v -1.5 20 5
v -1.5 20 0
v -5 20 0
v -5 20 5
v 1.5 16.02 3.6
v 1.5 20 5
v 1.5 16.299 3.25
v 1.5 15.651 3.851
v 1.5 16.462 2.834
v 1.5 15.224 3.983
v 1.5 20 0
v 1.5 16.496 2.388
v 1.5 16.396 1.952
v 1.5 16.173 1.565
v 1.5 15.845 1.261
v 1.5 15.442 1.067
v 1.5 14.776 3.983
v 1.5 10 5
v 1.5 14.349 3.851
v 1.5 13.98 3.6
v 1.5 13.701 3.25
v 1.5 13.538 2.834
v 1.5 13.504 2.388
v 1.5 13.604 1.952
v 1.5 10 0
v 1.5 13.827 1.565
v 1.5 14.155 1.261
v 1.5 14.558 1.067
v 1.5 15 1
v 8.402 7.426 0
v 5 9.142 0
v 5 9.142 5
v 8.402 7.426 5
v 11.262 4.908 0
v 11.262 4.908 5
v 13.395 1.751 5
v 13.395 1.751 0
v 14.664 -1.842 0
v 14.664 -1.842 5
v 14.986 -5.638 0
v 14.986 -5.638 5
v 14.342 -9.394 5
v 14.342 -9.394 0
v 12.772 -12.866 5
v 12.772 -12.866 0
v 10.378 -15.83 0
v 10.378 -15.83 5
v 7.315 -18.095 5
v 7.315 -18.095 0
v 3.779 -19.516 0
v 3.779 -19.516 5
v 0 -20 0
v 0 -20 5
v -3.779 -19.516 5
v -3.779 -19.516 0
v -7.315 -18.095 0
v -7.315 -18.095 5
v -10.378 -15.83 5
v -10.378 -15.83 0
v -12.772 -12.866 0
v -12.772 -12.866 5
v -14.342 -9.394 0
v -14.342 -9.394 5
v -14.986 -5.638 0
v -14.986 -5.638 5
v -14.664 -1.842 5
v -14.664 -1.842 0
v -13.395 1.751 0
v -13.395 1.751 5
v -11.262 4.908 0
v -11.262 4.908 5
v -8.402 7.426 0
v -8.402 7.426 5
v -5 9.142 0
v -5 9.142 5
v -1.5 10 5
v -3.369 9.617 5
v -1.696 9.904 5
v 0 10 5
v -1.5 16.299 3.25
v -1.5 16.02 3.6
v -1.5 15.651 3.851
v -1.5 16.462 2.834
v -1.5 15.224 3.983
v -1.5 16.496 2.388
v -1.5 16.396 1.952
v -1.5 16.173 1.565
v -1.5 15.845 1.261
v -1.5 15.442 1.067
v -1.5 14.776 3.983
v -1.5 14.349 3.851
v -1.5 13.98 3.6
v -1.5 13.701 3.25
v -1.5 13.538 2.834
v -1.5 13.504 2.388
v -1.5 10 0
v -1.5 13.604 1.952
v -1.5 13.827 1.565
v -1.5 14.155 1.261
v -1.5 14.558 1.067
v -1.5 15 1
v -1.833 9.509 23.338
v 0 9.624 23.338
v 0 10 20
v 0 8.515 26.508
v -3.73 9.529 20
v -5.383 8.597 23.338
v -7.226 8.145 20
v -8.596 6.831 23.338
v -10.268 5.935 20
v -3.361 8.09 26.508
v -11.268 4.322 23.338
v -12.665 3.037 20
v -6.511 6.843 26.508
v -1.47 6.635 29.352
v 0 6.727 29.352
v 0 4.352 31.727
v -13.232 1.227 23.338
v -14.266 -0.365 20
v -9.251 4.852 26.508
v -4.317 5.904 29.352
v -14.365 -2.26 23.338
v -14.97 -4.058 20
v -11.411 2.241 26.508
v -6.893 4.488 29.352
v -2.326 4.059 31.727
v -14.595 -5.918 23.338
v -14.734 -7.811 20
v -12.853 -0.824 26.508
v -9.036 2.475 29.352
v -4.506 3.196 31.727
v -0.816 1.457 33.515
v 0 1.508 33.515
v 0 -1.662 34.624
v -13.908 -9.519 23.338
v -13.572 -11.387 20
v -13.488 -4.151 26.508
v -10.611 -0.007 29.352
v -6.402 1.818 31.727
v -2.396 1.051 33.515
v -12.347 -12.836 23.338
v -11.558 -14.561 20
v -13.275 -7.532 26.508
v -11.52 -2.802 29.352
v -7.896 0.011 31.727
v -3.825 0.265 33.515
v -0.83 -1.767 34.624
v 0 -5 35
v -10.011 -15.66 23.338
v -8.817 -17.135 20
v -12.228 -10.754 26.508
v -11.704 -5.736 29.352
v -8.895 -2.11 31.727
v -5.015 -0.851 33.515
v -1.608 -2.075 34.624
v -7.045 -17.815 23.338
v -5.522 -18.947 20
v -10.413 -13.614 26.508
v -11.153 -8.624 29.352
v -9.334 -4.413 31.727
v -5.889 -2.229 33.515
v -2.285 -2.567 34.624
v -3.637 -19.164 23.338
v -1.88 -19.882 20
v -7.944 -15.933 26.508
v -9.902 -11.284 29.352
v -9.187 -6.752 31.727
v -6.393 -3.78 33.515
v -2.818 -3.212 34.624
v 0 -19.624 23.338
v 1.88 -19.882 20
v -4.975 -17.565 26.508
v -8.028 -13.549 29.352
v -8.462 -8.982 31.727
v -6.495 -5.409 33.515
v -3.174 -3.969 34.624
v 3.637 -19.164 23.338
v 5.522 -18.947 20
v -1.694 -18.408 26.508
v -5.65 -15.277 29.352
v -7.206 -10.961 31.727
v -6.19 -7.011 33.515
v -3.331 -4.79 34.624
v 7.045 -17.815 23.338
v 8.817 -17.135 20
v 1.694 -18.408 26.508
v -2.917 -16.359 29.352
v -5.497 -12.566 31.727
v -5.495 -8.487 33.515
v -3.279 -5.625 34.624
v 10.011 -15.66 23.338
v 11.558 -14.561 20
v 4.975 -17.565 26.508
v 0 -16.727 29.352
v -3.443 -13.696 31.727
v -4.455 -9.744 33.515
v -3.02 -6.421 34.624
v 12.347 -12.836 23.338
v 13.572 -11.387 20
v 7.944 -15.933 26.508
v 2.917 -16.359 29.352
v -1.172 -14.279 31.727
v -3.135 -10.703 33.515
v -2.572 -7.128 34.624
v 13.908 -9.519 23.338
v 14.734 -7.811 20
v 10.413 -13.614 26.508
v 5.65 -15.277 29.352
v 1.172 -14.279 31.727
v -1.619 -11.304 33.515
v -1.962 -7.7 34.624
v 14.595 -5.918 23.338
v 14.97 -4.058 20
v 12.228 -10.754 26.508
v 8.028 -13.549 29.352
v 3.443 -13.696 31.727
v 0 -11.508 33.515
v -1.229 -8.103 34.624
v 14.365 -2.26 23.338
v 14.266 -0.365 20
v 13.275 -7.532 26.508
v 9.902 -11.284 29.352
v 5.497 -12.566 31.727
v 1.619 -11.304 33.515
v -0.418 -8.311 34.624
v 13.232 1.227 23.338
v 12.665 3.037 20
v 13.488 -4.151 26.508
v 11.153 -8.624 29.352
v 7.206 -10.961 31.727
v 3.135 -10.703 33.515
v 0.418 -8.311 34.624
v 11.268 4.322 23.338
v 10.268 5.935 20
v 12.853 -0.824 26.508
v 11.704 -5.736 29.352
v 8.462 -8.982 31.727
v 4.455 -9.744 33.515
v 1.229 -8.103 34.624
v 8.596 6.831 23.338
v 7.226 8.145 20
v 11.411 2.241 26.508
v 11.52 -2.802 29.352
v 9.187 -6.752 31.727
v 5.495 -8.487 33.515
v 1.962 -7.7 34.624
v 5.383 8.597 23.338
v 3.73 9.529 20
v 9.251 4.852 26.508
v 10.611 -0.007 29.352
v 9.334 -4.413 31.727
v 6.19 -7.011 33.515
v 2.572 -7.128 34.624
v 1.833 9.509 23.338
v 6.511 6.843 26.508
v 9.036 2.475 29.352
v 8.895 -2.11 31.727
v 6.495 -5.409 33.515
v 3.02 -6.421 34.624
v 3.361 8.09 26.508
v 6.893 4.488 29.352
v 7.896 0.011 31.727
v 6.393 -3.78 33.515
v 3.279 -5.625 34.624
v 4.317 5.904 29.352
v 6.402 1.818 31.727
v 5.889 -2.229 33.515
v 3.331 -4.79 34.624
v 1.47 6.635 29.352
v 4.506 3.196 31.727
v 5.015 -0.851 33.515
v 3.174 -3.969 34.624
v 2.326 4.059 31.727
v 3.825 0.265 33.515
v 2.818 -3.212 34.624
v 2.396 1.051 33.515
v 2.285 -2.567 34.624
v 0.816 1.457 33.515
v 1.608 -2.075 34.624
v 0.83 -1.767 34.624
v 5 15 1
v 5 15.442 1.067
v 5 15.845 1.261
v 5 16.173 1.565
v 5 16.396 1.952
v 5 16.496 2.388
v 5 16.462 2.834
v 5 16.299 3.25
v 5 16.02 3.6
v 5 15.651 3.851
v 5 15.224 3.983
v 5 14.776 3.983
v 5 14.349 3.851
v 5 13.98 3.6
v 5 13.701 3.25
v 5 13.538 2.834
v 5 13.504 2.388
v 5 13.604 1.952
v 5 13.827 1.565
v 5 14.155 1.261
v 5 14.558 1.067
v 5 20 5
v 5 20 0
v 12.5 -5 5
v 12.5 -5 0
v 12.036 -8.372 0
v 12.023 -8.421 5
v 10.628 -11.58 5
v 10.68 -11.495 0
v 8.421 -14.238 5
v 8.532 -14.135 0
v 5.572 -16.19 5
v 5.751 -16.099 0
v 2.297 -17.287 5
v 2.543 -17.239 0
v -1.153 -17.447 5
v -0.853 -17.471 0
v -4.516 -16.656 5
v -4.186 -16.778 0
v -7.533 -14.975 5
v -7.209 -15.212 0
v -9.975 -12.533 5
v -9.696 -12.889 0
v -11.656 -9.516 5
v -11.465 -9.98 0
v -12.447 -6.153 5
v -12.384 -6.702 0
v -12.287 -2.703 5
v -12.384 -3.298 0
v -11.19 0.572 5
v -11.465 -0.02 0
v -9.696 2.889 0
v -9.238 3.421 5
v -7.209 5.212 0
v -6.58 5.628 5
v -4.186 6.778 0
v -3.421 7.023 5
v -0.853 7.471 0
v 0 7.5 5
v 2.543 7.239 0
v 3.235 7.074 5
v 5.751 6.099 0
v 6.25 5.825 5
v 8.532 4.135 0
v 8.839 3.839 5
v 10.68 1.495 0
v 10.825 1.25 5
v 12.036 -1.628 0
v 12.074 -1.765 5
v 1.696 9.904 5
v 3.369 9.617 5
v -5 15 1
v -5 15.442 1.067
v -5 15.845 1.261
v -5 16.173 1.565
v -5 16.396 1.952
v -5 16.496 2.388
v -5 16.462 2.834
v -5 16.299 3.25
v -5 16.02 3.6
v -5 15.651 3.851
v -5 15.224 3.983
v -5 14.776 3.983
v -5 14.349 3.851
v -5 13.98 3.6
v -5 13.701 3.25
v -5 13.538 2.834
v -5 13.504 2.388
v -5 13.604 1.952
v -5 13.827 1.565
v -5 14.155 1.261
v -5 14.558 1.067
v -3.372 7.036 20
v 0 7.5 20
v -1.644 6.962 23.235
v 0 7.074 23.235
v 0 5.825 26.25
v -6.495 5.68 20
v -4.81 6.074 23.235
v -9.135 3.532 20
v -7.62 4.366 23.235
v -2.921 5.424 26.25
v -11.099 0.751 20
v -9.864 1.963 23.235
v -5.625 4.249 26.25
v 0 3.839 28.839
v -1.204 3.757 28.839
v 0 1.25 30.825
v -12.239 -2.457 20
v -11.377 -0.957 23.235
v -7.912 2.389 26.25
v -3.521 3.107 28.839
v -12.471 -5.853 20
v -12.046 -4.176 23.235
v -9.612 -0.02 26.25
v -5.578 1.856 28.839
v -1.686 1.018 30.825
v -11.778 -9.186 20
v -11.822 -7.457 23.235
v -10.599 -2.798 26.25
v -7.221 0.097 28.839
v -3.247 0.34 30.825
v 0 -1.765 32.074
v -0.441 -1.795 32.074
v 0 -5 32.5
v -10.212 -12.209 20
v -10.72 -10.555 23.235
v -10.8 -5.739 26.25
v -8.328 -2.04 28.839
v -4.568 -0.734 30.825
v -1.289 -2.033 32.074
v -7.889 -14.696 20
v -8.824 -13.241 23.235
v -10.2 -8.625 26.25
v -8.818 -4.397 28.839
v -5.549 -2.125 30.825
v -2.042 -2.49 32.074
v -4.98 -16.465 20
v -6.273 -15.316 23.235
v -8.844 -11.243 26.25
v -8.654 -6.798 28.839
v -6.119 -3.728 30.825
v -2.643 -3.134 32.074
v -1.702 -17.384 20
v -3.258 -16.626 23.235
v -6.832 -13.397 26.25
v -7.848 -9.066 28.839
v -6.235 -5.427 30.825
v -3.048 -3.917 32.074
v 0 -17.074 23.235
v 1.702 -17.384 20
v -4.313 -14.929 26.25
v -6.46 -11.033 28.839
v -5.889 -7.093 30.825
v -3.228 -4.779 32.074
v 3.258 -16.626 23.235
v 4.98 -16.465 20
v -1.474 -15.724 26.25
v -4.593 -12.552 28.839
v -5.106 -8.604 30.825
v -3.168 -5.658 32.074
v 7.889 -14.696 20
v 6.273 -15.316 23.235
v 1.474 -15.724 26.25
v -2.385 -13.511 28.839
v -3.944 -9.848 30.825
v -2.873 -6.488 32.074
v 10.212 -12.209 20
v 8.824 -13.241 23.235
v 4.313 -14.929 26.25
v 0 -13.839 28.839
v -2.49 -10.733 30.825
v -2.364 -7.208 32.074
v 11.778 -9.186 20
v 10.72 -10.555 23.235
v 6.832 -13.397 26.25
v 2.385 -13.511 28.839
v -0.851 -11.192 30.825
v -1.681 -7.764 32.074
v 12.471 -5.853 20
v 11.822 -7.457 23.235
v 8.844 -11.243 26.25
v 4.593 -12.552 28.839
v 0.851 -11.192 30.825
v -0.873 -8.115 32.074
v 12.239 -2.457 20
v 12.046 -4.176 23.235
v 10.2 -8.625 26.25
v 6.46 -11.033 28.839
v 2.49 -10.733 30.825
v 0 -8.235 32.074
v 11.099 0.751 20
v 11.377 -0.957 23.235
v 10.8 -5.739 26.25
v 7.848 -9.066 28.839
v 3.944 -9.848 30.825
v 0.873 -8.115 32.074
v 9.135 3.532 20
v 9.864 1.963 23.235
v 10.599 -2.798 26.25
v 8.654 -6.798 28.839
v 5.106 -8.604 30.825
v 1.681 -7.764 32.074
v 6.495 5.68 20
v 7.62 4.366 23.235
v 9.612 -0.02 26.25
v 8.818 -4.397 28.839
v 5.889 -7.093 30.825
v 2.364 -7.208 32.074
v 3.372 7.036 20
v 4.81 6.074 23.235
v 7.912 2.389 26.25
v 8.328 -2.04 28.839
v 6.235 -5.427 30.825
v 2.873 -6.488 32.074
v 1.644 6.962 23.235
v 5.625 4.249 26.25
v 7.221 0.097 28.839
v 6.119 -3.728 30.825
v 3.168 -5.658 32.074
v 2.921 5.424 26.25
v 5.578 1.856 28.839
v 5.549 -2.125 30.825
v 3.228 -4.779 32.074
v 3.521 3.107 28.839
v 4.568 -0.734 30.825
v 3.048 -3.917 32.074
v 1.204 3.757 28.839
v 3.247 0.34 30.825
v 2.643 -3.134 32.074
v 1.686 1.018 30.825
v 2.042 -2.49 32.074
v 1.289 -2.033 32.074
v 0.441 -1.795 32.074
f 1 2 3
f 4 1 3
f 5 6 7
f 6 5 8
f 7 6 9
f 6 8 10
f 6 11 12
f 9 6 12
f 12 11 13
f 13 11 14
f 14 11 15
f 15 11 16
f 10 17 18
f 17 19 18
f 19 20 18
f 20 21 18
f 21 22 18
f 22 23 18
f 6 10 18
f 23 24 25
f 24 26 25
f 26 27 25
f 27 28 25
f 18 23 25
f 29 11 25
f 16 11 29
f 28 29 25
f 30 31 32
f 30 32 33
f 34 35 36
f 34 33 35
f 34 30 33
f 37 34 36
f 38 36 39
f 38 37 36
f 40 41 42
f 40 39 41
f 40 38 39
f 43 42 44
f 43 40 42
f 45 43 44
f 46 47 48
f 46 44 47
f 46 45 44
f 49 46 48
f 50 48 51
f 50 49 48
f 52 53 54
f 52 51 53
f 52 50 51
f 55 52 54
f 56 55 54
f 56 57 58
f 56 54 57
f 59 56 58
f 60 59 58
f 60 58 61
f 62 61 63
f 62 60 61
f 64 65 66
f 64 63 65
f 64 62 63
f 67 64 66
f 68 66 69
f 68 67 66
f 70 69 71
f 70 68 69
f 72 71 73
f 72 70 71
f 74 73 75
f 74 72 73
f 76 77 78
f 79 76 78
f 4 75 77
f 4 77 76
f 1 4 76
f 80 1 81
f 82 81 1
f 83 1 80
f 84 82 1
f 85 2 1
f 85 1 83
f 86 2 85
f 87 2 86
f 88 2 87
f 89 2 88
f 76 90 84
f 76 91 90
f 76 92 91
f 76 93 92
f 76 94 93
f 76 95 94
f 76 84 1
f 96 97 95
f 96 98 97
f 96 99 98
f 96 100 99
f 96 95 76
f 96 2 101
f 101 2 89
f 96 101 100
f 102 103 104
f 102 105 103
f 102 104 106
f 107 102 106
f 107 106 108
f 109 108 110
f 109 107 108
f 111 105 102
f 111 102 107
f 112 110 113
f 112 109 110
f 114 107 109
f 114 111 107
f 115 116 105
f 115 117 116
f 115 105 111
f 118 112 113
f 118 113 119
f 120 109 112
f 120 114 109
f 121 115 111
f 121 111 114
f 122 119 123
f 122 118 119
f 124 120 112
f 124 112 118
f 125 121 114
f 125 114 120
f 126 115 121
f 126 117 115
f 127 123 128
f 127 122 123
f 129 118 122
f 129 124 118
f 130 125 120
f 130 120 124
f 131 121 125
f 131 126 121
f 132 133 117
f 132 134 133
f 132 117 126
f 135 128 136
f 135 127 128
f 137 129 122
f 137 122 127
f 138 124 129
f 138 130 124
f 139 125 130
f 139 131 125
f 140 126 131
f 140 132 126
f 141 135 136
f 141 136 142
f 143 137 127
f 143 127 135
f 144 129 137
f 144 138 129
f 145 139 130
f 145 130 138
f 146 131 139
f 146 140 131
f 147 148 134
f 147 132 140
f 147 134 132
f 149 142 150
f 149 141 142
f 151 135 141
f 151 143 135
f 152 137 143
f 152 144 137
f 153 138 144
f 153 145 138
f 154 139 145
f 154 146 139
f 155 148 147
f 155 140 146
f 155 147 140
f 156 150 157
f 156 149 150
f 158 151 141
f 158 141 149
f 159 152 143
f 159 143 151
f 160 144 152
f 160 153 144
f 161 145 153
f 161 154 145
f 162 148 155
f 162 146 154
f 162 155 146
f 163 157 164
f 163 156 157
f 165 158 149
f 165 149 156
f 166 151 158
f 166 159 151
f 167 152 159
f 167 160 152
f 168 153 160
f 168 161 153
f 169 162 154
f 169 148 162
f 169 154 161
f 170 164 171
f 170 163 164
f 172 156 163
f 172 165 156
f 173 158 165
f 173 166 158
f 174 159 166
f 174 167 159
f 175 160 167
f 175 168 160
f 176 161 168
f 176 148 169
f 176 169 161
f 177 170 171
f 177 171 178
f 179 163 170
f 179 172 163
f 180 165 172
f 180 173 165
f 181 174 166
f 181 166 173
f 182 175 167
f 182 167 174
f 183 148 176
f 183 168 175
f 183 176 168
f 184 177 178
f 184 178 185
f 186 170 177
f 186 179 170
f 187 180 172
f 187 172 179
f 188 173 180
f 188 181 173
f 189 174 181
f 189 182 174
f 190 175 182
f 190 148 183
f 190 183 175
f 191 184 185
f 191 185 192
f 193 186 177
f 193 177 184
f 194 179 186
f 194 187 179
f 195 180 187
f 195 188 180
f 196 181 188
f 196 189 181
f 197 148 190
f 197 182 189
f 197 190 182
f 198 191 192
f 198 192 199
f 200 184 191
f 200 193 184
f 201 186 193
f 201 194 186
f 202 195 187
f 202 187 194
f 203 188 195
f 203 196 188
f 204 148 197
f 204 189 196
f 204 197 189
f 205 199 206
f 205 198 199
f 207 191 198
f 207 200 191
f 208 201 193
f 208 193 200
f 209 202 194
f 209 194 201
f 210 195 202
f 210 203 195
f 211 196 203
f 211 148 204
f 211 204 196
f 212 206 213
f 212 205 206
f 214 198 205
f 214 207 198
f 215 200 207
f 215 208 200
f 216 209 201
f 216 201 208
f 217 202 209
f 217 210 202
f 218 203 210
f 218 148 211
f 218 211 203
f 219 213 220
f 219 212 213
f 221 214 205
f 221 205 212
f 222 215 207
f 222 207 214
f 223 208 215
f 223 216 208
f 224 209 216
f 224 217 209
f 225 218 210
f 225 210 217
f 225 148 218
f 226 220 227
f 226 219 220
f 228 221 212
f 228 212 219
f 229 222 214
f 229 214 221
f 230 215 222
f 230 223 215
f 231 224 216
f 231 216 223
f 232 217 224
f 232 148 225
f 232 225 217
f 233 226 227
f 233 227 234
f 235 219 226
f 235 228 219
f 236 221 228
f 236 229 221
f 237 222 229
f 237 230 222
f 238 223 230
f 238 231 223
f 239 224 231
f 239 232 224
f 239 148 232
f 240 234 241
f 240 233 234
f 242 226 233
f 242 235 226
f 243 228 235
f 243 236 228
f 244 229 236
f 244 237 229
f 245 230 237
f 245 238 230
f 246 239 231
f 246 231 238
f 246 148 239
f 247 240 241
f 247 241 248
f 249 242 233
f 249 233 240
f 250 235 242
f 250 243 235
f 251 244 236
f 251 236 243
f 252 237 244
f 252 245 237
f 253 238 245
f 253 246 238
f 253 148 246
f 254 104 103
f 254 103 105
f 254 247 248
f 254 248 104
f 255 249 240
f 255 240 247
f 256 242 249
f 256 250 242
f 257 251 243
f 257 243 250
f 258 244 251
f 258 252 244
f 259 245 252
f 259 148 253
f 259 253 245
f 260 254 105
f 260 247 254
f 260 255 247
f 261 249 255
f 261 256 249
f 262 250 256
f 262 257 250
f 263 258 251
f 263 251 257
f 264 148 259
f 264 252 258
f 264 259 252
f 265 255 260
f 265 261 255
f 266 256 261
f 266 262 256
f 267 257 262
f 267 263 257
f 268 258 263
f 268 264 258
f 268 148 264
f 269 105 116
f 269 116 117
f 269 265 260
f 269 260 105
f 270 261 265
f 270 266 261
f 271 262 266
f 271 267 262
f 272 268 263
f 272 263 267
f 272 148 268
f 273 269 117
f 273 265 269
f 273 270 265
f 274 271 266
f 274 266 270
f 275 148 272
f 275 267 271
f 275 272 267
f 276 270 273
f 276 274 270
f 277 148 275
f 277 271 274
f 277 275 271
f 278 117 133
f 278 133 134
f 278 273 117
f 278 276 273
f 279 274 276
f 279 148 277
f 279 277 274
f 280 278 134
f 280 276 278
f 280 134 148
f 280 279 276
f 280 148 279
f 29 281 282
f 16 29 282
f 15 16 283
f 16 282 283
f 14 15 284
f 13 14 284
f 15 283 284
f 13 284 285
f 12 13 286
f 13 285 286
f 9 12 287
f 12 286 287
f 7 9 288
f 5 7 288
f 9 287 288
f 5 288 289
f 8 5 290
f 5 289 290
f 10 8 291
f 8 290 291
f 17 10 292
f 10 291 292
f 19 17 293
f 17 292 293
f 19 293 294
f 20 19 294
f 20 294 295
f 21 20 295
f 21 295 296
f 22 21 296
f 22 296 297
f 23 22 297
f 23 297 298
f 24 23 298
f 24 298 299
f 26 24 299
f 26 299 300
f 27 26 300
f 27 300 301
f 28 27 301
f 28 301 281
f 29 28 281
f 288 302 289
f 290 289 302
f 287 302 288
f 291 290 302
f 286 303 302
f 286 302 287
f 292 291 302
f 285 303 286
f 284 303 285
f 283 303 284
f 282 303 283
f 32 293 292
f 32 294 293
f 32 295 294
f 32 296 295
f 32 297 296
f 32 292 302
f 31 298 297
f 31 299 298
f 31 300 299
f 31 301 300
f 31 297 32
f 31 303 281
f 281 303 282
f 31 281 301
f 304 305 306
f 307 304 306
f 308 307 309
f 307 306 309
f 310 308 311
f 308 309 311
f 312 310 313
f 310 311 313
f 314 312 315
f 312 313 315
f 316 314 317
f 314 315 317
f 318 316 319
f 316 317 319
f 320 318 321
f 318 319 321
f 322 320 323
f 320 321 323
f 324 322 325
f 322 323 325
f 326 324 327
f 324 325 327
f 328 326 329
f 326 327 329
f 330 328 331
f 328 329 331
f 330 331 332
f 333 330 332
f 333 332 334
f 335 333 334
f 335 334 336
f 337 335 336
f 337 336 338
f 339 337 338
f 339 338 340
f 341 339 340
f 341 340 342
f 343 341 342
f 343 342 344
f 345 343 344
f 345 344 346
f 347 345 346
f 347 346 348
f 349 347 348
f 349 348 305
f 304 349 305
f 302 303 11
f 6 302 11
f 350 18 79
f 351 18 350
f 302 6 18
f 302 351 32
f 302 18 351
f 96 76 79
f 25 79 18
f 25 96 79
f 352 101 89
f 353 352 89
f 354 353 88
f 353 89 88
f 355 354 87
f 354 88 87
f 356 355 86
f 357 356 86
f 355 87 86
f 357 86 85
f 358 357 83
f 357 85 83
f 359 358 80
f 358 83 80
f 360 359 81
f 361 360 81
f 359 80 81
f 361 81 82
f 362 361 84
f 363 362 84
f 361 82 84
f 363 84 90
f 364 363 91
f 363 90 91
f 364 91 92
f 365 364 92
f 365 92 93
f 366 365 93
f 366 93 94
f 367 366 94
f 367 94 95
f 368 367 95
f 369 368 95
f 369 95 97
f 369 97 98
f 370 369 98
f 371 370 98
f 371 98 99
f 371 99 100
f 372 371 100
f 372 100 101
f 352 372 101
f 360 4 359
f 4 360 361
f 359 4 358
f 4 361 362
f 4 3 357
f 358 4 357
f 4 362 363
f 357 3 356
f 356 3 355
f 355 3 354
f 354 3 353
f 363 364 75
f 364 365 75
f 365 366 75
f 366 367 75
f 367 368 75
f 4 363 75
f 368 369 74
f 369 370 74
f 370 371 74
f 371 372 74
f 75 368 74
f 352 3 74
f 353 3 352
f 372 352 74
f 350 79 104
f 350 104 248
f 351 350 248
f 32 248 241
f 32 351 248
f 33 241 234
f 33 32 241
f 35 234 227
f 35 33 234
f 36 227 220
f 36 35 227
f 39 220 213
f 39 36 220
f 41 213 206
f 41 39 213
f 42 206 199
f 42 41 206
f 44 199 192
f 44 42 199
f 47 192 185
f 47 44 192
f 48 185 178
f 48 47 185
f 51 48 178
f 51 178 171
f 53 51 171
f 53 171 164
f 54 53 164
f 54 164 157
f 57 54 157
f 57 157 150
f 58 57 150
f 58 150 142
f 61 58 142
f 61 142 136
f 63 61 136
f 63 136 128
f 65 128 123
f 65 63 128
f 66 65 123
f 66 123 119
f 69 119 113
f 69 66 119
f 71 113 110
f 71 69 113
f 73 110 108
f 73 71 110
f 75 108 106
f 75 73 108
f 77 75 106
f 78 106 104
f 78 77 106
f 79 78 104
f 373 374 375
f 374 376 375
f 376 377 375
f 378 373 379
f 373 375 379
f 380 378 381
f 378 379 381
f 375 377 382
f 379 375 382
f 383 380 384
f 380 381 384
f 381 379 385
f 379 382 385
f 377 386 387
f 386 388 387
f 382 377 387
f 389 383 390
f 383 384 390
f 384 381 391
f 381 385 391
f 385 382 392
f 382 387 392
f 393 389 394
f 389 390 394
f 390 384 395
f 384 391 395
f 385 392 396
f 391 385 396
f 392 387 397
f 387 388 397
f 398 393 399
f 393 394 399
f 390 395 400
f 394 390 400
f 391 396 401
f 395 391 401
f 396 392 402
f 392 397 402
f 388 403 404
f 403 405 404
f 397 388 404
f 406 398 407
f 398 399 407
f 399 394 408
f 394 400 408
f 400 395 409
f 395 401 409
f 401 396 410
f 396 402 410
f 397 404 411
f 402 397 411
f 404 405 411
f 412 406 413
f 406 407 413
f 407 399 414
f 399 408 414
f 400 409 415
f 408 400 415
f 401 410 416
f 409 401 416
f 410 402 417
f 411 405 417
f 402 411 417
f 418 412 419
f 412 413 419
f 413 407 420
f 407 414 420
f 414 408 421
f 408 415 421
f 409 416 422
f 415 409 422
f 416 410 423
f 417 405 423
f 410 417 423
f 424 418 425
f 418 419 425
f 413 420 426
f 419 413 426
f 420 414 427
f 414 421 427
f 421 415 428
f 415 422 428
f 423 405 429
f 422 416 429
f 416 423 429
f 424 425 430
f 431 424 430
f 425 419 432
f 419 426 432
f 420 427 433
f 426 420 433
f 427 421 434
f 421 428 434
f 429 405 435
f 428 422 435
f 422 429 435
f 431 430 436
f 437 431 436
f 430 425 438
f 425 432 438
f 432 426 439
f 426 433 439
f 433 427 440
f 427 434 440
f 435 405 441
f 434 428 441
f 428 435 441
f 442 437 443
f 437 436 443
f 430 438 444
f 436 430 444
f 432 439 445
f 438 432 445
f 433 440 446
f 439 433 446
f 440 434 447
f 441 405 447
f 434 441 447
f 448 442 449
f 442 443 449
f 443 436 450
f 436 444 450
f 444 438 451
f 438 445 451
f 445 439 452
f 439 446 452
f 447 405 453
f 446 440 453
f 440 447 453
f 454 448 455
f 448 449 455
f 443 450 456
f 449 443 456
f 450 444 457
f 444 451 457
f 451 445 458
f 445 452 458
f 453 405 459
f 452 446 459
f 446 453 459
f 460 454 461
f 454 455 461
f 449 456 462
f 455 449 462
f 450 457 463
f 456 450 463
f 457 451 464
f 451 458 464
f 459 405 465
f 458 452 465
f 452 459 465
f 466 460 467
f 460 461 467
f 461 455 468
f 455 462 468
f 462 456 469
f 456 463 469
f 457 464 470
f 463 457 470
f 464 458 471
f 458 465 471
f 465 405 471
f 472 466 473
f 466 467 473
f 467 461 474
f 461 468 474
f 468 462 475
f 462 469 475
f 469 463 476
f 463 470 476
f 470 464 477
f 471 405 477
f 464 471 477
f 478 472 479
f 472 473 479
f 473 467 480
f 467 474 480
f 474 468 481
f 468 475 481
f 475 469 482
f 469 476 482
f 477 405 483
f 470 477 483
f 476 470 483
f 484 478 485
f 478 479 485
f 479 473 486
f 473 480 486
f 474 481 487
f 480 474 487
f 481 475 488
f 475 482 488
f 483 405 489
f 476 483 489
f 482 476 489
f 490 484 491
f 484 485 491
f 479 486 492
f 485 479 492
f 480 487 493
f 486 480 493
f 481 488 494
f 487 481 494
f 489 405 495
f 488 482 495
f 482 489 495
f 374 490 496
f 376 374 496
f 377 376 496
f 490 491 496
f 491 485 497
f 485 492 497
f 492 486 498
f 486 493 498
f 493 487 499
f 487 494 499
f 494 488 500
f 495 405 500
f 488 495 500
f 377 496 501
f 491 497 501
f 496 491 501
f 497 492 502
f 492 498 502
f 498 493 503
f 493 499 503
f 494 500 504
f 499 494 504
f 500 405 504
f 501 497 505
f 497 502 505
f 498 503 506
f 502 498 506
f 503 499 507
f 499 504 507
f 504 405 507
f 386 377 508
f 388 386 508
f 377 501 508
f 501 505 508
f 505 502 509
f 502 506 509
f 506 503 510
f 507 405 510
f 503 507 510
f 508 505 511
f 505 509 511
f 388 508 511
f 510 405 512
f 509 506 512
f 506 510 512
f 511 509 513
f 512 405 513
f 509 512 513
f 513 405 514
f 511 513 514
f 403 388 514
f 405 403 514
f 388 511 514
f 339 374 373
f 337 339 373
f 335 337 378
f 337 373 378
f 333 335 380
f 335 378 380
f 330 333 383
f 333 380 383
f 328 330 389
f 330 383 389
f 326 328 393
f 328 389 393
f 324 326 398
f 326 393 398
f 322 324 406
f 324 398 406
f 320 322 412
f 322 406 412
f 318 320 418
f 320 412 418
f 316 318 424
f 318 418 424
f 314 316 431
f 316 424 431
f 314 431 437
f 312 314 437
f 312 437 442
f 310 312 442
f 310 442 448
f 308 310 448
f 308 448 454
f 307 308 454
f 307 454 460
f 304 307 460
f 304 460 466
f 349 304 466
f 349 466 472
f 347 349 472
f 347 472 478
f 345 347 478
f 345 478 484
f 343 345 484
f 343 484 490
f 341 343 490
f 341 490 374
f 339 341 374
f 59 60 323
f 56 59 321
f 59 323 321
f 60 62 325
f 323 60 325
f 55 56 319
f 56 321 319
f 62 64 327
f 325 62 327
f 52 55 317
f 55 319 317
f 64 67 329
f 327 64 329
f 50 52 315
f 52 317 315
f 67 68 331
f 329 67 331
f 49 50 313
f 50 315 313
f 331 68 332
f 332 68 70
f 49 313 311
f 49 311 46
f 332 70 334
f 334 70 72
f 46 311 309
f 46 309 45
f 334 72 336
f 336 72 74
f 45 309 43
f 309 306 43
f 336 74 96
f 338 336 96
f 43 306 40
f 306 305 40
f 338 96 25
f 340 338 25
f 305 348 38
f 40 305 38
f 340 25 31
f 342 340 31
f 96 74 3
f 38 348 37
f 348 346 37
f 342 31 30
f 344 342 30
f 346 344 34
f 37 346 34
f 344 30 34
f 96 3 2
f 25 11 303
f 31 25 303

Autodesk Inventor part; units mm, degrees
ref_plane "YZ Plane" through (0, 0, 0) normal (1, 0, 0) x (0, 1, 0)
ref_plane "XZ Plane" through (0, 0, 0) normal (0, 1, 0) x (-1, 0, 0)
ref_plane "XY Plane" through (0, 0, 0) normal (0, 0, 1) x (1, 0, 0)
sketch "Sketch1" plane through (0, 0, 0) normal (0, 0, 1) x (1, 0, 0)
  line L0 (-5, 20) -> (-5, 9.1421)
  line L1 (0, 10) -> (0, 17.0552) construction
  line L2 (5, 20) -> (5, 9.1421)
  line L3 (5, 10) -> (-5, 10) construction
  line L4 (0, 10) -> (0, 20) construction
  line L5 (-1.5, 20) -> (-1.5, 10)
  line L6 (1.5, 20) -> (1.5, 10)
  line L7 (5, 20) -> (1.5, 20)
  line L8 (-1.5, 20) -> (-5, 20)
  line L9 (-1.5, 10) -> (1.5, 10)
  arc A0 (-5, 9.1421) -> (5, 9.1421) centre (0, -5) ccw
  circle A1 centre (0, -5) radius 12.5
  dimension "d46" = 1.5
  dimension "d61" = 25
extrude "Extrusion1" add sketch "Sketch1" along normal blind 5
sketch "Sketch4" plane through (5, 5.9087, 0) normal (1, 0, 0) x (0, 0, -1)
  line L0 (0, 14.0913) -> (-5, 14.0913) construction
  line L1 (-2.5, 14.0913) -> (-2.5, 9.0913) construction
  circle A0 centre (-2.5, 9.0913) radius 1.5
  point P0 (0, -5.9087)
  dimension "d30" = 5
  dimension "d31" = 3
extrude "Extrusion4" cut sketch "Sketch4" against normal blind 10
ref_plane "Work Plane1" through (0, 5.9087, 0) normal (1, 0, 0) x (0, 0, -1)
ref_plane "Work Plane2" through (0, 5.9087, 0) normal (1, 0, 0) x (0, 0, -1)
sketch "Sketch14" plane through (0, 5.9087, 0) normal (1, 0, 0) x (0, 0, -1)
  line L0 (-5, 1.5913) -> (-20, 1.5913)
  line L1 (-20, 1.5913) -> (-20, 4.0913)
  line L2 (-20, 4.0913) -> (-5, 4.0913)
  line L3 (-5, 1.5913) -> (-5, -23.4087) construction
  line L4 (-5, -10.9087) -> (-20, -10.9087) construction
  line L5 (-5, -23.4087) -> (-5, 1.5913) projected
  line L6 (-5, 4.0913) -> (-5, 1.5913)
  point P0 (0, -5.9087)
  dimension "d62" = 15
  dimension "d63" = 2.5
  dimension "d64" = 15
revolve "Revolution3" add sketch "Sketch14" angle 360 about axis through (0, -5, 5) along (0, 0, 1)
sketch "Sketch15" plane through (0, 5.9087, 0) normal (1, 0, 0) x (0, 0, -1)
  line L0 (-20, -23.4087) -> (-20, 1.5913) projected
  arc A0 (-20, 1.5913) -> (-32.5, -10.9087) centre (-20, -10.9087) ccw
  arc A1 (-20, 4.0913) -> (-35, -10.9087) centre (-20, -10.9087) ccw
  line L1 (-32.5, -10.9087) -> (-35, -10.9087) construction
  line L2 (-20, 1.5913) -> (-20, -23.4087) construction
  line L3 (-20, -25.9087) -> (-20, 4.0913) projected
  line L4 (-20, 1.5913) -> (-20, 4.0913)
  line L5 (-32.5, -10.9087) -> (-35, -10.9087)
  point P0 (0, -5.9087)
  dimension "d67" = 30
revolve "Revolution4" add sketch "Sketch15" angle 360 about axis through (0, -5, 32.5) along (0, 0, 1)
properties part number "beta_dummy _thumb"
